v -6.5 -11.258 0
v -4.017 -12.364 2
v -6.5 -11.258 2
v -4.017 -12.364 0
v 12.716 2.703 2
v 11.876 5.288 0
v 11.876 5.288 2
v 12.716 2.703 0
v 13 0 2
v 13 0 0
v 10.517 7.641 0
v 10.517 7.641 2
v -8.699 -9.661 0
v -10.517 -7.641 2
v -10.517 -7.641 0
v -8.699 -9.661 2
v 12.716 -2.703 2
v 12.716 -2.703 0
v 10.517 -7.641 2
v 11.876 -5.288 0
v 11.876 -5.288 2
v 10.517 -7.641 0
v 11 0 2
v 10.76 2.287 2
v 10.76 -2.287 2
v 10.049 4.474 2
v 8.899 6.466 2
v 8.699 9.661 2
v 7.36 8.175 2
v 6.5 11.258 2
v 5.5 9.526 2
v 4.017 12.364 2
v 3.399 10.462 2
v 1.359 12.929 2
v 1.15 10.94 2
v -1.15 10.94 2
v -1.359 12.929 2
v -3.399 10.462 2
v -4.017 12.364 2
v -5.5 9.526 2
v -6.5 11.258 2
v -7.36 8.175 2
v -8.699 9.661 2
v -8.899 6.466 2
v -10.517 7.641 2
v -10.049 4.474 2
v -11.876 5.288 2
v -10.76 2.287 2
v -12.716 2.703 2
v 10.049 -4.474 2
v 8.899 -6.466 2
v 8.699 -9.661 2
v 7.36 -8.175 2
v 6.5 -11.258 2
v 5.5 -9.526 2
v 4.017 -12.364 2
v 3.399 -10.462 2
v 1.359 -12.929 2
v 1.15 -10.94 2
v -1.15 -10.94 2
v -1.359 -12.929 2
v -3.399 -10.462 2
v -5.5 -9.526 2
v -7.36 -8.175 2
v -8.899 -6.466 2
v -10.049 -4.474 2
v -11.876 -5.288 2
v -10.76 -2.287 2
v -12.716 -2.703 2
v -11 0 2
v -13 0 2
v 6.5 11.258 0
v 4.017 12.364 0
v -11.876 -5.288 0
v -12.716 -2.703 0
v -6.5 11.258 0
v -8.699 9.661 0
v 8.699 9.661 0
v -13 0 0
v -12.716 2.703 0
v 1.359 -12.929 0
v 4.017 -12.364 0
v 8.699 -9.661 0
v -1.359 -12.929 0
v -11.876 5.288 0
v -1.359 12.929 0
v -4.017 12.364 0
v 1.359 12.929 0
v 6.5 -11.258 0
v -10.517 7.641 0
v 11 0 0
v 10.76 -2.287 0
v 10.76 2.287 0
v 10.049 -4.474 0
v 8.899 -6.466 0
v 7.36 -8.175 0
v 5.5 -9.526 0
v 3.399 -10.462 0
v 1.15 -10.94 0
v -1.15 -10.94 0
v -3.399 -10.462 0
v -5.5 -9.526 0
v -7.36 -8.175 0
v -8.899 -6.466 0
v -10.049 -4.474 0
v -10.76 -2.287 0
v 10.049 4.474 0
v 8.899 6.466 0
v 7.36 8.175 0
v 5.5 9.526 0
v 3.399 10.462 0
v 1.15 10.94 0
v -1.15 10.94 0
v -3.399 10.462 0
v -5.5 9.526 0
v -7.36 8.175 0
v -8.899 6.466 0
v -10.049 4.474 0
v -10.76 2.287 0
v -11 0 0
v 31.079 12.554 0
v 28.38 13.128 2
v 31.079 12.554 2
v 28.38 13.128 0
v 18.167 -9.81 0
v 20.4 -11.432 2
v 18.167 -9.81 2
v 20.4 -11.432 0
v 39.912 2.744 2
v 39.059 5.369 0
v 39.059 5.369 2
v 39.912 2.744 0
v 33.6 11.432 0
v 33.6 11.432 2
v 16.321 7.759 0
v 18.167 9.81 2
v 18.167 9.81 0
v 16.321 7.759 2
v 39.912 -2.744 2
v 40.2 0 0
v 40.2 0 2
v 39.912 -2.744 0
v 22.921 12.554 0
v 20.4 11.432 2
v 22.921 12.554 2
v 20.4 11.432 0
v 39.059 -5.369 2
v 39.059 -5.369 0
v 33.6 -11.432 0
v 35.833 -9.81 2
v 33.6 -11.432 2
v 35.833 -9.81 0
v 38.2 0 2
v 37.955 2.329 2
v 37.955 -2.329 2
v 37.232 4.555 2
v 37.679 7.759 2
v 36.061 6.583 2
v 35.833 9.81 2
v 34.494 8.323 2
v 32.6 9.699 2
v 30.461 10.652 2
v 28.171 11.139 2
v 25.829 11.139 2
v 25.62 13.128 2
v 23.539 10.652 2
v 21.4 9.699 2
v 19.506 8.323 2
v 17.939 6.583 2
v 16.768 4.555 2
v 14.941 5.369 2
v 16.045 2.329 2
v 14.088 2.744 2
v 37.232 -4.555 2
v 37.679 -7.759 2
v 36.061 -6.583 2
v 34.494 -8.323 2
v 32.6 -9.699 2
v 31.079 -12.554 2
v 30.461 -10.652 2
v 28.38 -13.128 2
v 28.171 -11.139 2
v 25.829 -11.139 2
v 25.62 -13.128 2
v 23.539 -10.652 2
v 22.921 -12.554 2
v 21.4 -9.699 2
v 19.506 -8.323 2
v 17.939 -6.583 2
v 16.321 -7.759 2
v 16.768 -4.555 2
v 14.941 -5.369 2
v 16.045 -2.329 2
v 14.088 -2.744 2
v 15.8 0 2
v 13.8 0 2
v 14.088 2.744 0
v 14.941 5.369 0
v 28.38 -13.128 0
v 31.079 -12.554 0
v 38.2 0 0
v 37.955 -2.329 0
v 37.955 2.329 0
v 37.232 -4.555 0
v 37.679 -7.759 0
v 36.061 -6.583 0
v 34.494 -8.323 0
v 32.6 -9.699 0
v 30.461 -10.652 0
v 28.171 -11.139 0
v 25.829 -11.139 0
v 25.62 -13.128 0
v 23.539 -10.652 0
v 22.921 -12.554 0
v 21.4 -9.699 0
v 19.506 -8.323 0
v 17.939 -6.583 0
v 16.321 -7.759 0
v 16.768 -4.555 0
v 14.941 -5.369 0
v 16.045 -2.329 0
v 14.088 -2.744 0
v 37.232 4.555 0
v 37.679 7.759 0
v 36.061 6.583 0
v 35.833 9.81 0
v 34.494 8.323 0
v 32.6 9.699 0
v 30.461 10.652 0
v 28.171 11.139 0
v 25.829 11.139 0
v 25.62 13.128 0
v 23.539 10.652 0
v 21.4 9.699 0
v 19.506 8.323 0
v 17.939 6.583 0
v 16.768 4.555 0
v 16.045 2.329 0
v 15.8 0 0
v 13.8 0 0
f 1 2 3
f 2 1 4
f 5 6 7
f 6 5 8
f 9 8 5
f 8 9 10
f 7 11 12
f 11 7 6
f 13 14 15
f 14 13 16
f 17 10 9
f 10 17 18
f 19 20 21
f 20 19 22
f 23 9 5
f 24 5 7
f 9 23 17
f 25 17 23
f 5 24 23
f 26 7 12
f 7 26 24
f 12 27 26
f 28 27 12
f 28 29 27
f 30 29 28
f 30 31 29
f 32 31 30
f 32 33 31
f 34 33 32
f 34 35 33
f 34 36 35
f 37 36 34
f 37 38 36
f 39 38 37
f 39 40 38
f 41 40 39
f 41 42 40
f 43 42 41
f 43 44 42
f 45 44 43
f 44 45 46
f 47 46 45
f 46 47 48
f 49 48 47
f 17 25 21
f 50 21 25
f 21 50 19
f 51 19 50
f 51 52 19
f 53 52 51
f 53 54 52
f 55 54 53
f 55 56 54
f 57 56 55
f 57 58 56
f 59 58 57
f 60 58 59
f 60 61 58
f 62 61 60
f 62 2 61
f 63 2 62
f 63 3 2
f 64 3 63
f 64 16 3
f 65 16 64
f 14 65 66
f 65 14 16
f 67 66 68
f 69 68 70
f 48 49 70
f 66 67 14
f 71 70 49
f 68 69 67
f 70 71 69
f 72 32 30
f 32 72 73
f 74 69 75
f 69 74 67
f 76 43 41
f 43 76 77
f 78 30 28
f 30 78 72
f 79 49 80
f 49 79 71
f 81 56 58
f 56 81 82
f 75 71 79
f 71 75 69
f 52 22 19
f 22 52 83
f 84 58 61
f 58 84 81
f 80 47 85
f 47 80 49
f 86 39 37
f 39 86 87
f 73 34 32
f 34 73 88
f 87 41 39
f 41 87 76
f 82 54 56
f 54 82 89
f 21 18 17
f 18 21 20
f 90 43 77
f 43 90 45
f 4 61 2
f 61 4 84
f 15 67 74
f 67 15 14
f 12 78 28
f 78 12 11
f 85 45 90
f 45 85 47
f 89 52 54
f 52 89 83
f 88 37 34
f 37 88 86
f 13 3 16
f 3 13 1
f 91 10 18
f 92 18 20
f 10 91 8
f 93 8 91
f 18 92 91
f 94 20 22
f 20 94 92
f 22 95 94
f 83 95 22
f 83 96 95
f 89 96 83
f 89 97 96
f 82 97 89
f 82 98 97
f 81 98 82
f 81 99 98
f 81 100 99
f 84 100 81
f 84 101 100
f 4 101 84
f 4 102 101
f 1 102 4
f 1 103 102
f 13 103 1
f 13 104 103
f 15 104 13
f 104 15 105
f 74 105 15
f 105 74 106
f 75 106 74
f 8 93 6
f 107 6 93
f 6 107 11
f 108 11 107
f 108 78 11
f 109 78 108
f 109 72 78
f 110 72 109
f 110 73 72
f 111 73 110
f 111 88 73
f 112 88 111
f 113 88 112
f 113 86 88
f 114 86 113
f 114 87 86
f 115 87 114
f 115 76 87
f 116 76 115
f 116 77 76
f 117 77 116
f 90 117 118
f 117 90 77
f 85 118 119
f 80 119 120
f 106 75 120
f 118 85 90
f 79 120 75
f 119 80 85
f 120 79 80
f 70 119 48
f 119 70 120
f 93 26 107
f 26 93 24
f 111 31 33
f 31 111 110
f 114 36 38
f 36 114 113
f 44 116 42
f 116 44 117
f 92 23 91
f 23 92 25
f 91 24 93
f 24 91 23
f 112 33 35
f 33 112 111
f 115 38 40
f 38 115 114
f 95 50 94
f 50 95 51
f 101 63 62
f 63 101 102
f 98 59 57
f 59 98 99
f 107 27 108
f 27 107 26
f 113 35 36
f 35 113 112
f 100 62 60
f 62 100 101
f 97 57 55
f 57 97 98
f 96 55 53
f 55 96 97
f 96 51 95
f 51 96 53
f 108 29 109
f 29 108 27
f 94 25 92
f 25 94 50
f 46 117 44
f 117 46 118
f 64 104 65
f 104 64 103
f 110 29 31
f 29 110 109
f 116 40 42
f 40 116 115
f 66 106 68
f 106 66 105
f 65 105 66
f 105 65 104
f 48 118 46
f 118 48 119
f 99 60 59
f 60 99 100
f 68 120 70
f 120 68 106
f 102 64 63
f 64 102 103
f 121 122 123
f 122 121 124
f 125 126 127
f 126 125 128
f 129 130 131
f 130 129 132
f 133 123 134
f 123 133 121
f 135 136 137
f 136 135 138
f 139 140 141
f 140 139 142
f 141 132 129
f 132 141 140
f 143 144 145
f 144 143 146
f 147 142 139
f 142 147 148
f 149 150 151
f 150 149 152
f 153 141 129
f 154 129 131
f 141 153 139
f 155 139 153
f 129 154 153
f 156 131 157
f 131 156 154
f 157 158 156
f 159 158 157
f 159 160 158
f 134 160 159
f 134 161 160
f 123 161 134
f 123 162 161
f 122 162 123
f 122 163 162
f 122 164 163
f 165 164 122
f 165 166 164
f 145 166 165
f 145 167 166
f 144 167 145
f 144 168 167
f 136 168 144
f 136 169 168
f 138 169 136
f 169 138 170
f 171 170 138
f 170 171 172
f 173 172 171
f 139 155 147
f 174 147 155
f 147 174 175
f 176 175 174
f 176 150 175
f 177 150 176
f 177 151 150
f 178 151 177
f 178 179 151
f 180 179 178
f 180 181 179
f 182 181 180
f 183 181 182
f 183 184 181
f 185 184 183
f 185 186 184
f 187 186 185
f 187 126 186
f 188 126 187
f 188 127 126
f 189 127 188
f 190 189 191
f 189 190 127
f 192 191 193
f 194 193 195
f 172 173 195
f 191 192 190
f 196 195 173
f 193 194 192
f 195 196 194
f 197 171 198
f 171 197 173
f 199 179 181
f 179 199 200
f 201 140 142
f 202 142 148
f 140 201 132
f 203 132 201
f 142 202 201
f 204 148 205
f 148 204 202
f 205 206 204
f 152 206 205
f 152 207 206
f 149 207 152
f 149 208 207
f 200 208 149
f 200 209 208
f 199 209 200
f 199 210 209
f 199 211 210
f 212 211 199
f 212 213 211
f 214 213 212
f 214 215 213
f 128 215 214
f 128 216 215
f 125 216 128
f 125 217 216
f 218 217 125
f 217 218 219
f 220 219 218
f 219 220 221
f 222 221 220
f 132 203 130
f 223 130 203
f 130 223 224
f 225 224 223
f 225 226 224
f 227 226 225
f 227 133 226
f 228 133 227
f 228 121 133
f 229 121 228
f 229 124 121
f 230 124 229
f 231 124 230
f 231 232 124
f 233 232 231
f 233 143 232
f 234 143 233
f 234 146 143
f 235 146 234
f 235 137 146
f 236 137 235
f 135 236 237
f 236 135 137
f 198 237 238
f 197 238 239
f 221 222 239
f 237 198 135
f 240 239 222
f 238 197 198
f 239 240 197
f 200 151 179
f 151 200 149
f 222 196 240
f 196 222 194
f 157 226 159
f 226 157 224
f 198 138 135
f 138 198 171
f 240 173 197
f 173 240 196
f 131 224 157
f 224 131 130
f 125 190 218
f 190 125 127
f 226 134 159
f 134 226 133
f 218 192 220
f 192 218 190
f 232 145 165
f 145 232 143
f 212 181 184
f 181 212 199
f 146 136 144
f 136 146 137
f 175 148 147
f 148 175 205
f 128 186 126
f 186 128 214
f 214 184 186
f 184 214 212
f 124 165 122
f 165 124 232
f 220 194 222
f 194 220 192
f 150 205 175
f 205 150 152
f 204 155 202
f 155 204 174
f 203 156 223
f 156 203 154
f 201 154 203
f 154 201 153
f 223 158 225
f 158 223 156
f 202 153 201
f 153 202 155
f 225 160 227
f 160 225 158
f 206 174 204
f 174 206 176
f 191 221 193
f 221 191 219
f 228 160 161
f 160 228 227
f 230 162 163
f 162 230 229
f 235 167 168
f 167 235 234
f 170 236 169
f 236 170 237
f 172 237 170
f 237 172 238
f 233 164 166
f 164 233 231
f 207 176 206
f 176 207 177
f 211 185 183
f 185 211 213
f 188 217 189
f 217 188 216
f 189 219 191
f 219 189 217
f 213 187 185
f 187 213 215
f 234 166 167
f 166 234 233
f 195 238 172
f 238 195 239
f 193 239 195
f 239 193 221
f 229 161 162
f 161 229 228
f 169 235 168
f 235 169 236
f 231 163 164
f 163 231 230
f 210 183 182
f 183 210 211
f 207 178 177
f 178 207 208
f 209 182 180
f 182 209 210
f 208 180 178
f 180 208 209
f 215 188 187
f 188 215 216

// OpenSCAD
za = 2.0;

dr = 2.0;
r1 = 11.0;

difference() {
  cylinder( r=r1+dr, h = za );
  cylinder( r=r1   , h = za );
}


translate([27,0,0]) difference() {
  cylinder( r=r1+dr+0.2, h = za );
  cylinder( r=r1+0.2   , h = za );
}
